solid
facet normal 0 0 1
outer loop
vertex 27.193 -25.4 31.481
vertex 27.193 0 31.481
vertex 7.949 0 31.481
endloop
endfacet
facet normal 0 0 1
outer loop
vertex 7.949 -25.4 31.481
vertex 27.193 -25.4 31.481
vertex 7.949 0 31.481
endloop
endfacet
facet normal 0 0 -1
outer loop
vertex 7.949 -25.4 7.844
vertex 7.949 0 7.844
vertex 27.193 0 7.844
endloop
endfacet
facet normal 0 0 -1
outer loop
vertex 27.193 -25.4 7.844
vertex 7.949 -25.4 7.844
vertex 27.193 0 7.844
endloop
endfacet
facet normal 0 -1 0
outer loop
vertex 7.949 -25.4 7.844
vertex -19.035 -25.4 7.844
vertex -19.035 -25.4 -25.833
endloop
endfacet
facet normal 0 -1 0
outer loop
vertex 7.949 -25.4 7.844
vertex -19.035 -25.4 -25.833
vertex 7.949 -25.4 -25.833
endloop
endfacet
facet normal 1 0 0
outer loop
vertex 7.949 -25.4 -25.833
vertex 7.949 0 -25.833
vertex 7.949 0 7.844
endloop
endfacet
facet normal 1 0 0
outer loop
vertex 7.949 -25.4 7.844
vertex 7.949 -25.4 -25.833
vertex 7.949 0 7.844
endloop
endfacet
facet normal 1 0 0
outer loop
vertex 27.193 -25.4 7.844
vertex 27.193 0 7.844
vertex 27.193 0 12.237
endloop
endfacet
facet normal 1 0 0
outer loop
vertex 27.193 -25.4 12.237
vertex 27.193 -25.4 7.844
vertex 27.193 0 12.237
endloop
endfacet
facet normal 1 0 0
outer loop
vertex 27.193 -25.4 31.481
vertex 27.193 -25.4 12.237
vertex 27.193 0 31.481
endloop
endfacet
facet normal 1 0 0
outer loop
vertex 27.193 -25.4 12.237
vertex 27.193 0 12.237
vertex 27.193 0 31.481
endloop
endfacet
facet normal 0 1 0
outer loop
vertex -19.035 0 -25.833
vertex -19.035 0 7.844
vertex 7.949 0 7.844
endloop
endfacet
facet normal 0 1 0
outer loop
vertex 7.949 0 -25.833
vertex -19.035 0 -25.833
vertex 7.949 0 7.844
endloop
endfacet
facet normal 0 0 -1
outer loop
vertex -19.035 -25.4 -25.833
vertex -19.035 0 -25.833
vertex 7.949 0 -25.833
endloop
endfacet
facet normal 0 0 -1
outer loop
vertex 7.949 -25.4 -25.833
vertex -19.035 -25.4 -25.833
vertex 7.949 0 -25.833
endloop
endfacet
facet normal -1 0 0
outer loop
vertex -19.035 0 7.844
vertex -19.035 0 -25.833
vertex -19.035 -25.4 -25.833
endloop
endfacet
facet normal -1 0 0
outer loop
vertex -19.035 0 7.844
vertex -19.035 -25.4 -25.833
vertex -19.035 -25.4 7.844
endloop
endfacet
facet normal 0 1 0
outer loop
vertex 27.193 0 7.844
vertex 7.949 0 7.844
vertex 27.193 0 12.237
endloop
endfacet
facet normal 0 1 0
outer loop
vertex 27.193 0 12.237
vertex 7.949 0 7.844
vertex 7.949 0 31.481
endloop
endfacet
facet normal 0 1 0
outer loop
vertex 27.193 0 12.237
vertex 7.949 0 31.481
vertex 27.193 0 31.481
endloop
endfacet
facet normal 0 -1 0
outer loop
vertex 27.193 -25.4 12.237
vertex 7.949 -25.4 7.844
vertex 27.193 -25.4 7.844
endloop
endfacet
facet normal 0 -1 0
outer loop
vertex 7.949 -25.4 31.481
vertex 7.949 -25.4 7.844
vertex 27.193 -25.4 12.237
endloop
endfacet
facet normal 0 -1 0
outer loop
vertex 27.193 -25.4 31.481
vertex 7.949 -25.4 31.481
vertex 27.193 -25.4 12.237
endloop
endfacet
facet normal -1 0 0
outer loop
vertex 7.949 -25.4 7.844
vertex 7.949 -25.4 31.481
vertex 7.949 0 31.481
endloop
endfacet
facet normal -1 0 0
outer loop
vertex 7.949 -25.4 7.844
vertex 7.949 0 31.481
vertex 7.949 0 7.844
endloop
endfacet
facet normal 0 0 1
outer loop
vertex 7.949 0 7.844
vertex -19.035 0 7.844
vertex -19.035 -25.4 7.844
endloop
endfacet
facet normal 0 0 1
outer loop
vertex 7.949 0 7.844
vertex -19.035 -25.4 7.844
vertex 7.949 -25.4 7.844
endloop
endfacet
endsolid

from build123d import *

# Parameters (mm, degrees)
F0_W     = 16.7341167107
F0_H     = 19.2442368716
F1_DEPTH = 25.4
F0_W_2   = 26.9837649539
F0_H_2   = 33.6774131283


# Not quite as in the source:
# - a feature of the source that left no trace in its solid (it failed there, or was rolled back) is left out


with BuildPart() as f1:
    # F0 (on Front) → F1 (new body)
    with BuildSketch(Plane.XZ):
        with Locations((18.8258825801, 21.858942695)):
            Rectangle(F0_W, F0_H)
        Polygon((10.4588242248, 12.2368242592), (10.4588242248, 31.4810611308), (7.9487068579, 31.4810611308), (7.9487068579, 7.8441174701), (27.1929409355, 7.8441174701), (27.1929409355, 12.2368242592), align=None)
    extrude(amount=F1_DEPTH)


with BuildPart() as f1b:
    # F0 (on Front) → F1, piece 2 (new body)
    with BuildSketch(Plane.XZ):
        with Locations((-5.5431756191, -8.9945890941)):
            Rectangle(F0_W_2, F0_H_2)
    extrude(amount=F1_DEPTH)


solid = Compound([f1.part, f1b.part])
